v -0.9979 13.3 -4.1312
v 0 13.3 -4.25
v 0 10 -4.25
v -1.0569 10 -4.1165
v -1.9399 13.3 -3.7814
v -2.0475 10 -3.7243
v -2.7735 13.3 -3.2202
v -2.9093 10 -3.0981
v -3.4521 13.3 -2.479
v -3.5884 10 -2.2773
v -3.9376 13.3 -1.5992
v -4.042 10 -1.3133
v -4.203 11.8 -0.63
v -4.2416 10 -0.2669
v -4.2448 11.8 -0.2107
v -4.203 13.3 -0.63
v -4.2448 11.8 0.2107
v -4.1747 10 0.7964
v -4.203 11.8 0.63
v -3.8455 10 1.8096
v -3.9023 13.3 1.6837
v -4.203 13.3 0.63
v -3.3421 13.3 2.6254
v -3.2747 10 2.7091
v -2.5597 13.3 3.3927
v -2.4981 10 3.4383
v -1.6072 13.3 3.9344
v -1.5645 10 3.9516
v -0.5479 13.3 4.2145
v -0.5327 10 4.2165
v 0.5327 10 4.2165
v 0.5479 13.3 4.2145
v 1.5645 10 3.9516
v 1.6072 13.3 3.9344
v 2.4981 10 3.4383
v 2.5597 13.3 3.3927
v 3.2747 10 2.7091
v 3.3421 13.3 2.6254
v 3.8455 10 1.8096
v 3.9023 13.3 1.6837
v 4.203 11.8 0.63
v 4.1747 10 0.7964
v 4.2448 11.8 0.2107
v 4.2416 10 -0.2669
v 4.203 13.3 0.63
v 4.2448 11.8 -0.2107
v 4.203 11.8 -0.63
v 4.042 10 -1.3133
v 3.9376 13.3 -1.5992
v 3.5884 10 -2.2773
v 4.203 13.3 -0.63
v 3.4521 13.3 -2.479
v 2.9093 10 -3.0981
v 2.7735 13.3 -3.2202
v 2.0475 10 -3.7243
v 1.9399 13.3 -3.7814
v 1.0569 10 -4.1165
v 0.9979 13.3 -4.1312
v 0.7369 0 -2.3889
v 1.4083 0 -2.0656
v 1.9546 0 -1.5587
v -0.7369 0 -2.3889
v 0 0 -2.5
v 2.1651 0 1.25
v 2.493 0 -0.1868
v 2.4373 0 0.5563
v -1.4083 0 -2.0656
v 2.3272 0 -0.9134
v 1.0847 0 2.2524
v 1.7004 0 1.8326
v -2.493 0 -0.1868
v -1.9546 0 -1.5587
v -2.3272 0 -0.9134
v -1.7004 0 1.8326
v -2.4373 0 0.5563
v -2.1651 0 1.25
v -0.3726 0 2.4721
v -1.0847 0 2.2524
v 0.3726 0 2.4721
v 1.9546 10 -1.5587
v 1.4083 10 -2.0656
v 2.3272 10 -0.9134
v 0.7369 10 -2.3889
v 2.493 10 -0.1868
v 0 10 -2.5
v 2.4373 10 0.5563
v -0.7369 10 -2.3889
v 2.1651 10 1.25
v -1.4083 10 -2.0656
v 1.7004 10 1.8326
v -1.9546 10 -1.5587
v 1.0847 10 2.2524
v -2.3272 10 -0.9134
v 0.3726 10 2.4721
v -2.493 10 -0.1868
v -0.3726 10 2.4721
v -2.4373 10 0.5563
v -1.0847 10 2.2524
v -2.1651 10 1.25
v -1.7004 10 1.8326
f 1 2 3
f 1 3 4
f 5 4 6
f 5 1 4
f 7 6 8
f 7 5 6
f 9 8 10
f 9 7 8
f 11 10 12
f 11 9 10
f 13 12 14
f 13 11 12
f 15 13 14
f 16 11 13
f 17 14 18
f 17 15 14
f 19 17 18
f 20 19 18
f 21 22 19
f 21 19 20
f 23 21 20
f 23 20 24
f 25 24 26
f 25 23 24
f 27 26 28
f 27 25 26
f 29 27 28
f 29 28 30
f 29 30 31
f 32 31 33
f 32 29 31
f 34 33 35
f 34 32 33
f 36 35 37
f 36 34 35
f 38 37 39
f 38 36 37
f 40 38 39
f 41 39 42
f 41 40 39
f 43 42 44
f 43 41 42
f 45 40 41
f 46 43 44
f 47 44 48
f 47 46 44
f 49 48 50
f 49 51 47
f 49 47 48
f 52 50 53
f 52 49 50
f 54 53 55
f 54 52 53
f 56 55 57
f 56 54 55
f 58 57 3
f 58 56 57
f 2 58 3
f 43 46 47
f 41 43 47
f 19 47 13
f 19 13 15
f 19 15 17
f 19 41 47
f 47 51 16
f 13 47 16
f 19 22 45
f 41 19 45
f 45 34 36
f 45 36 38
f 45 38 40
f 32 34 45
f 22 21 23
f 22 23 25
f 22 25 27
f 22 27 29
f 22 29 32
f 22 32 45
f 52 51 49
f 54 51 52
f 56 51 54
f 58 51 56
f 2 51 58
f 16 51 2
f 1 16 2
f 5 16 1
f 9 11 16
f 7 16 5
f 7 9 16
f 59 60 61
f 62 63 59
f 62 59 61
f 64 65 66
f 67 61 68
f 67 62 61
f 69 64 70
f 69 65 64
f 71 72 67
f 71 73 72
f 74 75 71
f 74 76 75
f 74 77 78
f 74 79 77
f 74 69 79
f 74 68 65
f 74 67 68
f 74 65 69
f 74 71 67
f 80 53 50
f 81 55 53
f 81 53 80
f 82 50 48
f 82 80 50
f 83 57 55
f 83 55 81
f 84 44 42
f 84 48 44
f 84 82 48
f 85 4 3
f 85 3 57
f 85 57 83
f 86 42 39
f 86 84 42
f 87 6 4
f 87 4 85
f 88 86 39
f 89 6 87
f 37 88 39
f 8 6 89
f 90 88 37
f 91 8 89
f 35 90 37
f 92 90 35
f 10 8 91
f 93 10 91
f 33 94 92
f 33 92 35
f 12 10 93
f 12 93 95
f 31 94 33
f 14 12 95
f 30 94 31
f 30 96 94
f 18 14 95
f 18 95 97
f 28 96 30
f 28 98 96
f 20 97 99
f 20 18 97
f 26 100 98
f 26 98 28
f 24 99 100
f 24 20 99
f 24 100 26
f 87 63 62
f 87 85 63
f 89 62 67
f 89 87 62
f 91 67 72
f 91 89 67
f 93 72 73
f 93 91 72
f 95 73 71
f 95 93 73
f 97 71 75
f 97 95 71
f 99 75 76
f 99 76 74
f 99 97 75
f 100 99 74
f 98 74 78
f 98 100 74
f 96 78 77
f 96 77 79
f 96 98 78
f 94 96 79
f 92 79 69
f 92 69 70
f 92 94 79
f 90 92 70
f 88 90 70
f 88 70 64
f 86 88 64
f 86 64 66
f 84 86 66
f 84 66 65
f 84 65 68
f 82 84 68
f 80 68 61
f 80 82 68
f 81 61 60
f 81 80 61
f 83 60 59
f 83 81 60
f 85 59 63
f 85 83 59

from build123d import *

# Parameters (mm, degrees)
CUT_EXTRUDE_1_DEPTH = 1.5


with BuildPart() as part:
    # Эскиз1 → Revolve 256 (revolve)
    with BuildSketch(Plane.XY, mode=Mode.PRIVATE) as revolve_256_sk:
        Polygon((0, 0), (2.5, 0), (2.5, 10), (4.25, 10), (4.25, 13.3), (0, 13.3), align=None)
    revolve(revolve_256_sk.sketch.rotate(Axis((0, 0, 0), (0, 1, 0)), 90), axis=Axis((0, 0, 0), (0, 1, 0)))

    # Эскиз2 → Вырез-Вытянуть1 (cut)
    with BuildSketch(Plane(origin=(0, 13.3, 0), x_dir=(-1, 0, 0), z_dir=(0, 1, 0))):
        with BuildLine():
            Line((-4.203046514, -0.63), (4.203046514, -0.63))
            ThreePointArc((4.203046514, -0.63), (4.25, 0), (4.203046514, 0.63))
            Line((4.203046514, 0.63), (-4.203046514, 0.63))
            ThreePointArc((-4.203046514, 0.63), (-4.25, 0), (-4.203046514, -0.63))
        make_face()
    extrude(amount=-CUT_EXTRUDE_1_DEPTH, mode=Mode.SUBTRACT)


solid = part.part
